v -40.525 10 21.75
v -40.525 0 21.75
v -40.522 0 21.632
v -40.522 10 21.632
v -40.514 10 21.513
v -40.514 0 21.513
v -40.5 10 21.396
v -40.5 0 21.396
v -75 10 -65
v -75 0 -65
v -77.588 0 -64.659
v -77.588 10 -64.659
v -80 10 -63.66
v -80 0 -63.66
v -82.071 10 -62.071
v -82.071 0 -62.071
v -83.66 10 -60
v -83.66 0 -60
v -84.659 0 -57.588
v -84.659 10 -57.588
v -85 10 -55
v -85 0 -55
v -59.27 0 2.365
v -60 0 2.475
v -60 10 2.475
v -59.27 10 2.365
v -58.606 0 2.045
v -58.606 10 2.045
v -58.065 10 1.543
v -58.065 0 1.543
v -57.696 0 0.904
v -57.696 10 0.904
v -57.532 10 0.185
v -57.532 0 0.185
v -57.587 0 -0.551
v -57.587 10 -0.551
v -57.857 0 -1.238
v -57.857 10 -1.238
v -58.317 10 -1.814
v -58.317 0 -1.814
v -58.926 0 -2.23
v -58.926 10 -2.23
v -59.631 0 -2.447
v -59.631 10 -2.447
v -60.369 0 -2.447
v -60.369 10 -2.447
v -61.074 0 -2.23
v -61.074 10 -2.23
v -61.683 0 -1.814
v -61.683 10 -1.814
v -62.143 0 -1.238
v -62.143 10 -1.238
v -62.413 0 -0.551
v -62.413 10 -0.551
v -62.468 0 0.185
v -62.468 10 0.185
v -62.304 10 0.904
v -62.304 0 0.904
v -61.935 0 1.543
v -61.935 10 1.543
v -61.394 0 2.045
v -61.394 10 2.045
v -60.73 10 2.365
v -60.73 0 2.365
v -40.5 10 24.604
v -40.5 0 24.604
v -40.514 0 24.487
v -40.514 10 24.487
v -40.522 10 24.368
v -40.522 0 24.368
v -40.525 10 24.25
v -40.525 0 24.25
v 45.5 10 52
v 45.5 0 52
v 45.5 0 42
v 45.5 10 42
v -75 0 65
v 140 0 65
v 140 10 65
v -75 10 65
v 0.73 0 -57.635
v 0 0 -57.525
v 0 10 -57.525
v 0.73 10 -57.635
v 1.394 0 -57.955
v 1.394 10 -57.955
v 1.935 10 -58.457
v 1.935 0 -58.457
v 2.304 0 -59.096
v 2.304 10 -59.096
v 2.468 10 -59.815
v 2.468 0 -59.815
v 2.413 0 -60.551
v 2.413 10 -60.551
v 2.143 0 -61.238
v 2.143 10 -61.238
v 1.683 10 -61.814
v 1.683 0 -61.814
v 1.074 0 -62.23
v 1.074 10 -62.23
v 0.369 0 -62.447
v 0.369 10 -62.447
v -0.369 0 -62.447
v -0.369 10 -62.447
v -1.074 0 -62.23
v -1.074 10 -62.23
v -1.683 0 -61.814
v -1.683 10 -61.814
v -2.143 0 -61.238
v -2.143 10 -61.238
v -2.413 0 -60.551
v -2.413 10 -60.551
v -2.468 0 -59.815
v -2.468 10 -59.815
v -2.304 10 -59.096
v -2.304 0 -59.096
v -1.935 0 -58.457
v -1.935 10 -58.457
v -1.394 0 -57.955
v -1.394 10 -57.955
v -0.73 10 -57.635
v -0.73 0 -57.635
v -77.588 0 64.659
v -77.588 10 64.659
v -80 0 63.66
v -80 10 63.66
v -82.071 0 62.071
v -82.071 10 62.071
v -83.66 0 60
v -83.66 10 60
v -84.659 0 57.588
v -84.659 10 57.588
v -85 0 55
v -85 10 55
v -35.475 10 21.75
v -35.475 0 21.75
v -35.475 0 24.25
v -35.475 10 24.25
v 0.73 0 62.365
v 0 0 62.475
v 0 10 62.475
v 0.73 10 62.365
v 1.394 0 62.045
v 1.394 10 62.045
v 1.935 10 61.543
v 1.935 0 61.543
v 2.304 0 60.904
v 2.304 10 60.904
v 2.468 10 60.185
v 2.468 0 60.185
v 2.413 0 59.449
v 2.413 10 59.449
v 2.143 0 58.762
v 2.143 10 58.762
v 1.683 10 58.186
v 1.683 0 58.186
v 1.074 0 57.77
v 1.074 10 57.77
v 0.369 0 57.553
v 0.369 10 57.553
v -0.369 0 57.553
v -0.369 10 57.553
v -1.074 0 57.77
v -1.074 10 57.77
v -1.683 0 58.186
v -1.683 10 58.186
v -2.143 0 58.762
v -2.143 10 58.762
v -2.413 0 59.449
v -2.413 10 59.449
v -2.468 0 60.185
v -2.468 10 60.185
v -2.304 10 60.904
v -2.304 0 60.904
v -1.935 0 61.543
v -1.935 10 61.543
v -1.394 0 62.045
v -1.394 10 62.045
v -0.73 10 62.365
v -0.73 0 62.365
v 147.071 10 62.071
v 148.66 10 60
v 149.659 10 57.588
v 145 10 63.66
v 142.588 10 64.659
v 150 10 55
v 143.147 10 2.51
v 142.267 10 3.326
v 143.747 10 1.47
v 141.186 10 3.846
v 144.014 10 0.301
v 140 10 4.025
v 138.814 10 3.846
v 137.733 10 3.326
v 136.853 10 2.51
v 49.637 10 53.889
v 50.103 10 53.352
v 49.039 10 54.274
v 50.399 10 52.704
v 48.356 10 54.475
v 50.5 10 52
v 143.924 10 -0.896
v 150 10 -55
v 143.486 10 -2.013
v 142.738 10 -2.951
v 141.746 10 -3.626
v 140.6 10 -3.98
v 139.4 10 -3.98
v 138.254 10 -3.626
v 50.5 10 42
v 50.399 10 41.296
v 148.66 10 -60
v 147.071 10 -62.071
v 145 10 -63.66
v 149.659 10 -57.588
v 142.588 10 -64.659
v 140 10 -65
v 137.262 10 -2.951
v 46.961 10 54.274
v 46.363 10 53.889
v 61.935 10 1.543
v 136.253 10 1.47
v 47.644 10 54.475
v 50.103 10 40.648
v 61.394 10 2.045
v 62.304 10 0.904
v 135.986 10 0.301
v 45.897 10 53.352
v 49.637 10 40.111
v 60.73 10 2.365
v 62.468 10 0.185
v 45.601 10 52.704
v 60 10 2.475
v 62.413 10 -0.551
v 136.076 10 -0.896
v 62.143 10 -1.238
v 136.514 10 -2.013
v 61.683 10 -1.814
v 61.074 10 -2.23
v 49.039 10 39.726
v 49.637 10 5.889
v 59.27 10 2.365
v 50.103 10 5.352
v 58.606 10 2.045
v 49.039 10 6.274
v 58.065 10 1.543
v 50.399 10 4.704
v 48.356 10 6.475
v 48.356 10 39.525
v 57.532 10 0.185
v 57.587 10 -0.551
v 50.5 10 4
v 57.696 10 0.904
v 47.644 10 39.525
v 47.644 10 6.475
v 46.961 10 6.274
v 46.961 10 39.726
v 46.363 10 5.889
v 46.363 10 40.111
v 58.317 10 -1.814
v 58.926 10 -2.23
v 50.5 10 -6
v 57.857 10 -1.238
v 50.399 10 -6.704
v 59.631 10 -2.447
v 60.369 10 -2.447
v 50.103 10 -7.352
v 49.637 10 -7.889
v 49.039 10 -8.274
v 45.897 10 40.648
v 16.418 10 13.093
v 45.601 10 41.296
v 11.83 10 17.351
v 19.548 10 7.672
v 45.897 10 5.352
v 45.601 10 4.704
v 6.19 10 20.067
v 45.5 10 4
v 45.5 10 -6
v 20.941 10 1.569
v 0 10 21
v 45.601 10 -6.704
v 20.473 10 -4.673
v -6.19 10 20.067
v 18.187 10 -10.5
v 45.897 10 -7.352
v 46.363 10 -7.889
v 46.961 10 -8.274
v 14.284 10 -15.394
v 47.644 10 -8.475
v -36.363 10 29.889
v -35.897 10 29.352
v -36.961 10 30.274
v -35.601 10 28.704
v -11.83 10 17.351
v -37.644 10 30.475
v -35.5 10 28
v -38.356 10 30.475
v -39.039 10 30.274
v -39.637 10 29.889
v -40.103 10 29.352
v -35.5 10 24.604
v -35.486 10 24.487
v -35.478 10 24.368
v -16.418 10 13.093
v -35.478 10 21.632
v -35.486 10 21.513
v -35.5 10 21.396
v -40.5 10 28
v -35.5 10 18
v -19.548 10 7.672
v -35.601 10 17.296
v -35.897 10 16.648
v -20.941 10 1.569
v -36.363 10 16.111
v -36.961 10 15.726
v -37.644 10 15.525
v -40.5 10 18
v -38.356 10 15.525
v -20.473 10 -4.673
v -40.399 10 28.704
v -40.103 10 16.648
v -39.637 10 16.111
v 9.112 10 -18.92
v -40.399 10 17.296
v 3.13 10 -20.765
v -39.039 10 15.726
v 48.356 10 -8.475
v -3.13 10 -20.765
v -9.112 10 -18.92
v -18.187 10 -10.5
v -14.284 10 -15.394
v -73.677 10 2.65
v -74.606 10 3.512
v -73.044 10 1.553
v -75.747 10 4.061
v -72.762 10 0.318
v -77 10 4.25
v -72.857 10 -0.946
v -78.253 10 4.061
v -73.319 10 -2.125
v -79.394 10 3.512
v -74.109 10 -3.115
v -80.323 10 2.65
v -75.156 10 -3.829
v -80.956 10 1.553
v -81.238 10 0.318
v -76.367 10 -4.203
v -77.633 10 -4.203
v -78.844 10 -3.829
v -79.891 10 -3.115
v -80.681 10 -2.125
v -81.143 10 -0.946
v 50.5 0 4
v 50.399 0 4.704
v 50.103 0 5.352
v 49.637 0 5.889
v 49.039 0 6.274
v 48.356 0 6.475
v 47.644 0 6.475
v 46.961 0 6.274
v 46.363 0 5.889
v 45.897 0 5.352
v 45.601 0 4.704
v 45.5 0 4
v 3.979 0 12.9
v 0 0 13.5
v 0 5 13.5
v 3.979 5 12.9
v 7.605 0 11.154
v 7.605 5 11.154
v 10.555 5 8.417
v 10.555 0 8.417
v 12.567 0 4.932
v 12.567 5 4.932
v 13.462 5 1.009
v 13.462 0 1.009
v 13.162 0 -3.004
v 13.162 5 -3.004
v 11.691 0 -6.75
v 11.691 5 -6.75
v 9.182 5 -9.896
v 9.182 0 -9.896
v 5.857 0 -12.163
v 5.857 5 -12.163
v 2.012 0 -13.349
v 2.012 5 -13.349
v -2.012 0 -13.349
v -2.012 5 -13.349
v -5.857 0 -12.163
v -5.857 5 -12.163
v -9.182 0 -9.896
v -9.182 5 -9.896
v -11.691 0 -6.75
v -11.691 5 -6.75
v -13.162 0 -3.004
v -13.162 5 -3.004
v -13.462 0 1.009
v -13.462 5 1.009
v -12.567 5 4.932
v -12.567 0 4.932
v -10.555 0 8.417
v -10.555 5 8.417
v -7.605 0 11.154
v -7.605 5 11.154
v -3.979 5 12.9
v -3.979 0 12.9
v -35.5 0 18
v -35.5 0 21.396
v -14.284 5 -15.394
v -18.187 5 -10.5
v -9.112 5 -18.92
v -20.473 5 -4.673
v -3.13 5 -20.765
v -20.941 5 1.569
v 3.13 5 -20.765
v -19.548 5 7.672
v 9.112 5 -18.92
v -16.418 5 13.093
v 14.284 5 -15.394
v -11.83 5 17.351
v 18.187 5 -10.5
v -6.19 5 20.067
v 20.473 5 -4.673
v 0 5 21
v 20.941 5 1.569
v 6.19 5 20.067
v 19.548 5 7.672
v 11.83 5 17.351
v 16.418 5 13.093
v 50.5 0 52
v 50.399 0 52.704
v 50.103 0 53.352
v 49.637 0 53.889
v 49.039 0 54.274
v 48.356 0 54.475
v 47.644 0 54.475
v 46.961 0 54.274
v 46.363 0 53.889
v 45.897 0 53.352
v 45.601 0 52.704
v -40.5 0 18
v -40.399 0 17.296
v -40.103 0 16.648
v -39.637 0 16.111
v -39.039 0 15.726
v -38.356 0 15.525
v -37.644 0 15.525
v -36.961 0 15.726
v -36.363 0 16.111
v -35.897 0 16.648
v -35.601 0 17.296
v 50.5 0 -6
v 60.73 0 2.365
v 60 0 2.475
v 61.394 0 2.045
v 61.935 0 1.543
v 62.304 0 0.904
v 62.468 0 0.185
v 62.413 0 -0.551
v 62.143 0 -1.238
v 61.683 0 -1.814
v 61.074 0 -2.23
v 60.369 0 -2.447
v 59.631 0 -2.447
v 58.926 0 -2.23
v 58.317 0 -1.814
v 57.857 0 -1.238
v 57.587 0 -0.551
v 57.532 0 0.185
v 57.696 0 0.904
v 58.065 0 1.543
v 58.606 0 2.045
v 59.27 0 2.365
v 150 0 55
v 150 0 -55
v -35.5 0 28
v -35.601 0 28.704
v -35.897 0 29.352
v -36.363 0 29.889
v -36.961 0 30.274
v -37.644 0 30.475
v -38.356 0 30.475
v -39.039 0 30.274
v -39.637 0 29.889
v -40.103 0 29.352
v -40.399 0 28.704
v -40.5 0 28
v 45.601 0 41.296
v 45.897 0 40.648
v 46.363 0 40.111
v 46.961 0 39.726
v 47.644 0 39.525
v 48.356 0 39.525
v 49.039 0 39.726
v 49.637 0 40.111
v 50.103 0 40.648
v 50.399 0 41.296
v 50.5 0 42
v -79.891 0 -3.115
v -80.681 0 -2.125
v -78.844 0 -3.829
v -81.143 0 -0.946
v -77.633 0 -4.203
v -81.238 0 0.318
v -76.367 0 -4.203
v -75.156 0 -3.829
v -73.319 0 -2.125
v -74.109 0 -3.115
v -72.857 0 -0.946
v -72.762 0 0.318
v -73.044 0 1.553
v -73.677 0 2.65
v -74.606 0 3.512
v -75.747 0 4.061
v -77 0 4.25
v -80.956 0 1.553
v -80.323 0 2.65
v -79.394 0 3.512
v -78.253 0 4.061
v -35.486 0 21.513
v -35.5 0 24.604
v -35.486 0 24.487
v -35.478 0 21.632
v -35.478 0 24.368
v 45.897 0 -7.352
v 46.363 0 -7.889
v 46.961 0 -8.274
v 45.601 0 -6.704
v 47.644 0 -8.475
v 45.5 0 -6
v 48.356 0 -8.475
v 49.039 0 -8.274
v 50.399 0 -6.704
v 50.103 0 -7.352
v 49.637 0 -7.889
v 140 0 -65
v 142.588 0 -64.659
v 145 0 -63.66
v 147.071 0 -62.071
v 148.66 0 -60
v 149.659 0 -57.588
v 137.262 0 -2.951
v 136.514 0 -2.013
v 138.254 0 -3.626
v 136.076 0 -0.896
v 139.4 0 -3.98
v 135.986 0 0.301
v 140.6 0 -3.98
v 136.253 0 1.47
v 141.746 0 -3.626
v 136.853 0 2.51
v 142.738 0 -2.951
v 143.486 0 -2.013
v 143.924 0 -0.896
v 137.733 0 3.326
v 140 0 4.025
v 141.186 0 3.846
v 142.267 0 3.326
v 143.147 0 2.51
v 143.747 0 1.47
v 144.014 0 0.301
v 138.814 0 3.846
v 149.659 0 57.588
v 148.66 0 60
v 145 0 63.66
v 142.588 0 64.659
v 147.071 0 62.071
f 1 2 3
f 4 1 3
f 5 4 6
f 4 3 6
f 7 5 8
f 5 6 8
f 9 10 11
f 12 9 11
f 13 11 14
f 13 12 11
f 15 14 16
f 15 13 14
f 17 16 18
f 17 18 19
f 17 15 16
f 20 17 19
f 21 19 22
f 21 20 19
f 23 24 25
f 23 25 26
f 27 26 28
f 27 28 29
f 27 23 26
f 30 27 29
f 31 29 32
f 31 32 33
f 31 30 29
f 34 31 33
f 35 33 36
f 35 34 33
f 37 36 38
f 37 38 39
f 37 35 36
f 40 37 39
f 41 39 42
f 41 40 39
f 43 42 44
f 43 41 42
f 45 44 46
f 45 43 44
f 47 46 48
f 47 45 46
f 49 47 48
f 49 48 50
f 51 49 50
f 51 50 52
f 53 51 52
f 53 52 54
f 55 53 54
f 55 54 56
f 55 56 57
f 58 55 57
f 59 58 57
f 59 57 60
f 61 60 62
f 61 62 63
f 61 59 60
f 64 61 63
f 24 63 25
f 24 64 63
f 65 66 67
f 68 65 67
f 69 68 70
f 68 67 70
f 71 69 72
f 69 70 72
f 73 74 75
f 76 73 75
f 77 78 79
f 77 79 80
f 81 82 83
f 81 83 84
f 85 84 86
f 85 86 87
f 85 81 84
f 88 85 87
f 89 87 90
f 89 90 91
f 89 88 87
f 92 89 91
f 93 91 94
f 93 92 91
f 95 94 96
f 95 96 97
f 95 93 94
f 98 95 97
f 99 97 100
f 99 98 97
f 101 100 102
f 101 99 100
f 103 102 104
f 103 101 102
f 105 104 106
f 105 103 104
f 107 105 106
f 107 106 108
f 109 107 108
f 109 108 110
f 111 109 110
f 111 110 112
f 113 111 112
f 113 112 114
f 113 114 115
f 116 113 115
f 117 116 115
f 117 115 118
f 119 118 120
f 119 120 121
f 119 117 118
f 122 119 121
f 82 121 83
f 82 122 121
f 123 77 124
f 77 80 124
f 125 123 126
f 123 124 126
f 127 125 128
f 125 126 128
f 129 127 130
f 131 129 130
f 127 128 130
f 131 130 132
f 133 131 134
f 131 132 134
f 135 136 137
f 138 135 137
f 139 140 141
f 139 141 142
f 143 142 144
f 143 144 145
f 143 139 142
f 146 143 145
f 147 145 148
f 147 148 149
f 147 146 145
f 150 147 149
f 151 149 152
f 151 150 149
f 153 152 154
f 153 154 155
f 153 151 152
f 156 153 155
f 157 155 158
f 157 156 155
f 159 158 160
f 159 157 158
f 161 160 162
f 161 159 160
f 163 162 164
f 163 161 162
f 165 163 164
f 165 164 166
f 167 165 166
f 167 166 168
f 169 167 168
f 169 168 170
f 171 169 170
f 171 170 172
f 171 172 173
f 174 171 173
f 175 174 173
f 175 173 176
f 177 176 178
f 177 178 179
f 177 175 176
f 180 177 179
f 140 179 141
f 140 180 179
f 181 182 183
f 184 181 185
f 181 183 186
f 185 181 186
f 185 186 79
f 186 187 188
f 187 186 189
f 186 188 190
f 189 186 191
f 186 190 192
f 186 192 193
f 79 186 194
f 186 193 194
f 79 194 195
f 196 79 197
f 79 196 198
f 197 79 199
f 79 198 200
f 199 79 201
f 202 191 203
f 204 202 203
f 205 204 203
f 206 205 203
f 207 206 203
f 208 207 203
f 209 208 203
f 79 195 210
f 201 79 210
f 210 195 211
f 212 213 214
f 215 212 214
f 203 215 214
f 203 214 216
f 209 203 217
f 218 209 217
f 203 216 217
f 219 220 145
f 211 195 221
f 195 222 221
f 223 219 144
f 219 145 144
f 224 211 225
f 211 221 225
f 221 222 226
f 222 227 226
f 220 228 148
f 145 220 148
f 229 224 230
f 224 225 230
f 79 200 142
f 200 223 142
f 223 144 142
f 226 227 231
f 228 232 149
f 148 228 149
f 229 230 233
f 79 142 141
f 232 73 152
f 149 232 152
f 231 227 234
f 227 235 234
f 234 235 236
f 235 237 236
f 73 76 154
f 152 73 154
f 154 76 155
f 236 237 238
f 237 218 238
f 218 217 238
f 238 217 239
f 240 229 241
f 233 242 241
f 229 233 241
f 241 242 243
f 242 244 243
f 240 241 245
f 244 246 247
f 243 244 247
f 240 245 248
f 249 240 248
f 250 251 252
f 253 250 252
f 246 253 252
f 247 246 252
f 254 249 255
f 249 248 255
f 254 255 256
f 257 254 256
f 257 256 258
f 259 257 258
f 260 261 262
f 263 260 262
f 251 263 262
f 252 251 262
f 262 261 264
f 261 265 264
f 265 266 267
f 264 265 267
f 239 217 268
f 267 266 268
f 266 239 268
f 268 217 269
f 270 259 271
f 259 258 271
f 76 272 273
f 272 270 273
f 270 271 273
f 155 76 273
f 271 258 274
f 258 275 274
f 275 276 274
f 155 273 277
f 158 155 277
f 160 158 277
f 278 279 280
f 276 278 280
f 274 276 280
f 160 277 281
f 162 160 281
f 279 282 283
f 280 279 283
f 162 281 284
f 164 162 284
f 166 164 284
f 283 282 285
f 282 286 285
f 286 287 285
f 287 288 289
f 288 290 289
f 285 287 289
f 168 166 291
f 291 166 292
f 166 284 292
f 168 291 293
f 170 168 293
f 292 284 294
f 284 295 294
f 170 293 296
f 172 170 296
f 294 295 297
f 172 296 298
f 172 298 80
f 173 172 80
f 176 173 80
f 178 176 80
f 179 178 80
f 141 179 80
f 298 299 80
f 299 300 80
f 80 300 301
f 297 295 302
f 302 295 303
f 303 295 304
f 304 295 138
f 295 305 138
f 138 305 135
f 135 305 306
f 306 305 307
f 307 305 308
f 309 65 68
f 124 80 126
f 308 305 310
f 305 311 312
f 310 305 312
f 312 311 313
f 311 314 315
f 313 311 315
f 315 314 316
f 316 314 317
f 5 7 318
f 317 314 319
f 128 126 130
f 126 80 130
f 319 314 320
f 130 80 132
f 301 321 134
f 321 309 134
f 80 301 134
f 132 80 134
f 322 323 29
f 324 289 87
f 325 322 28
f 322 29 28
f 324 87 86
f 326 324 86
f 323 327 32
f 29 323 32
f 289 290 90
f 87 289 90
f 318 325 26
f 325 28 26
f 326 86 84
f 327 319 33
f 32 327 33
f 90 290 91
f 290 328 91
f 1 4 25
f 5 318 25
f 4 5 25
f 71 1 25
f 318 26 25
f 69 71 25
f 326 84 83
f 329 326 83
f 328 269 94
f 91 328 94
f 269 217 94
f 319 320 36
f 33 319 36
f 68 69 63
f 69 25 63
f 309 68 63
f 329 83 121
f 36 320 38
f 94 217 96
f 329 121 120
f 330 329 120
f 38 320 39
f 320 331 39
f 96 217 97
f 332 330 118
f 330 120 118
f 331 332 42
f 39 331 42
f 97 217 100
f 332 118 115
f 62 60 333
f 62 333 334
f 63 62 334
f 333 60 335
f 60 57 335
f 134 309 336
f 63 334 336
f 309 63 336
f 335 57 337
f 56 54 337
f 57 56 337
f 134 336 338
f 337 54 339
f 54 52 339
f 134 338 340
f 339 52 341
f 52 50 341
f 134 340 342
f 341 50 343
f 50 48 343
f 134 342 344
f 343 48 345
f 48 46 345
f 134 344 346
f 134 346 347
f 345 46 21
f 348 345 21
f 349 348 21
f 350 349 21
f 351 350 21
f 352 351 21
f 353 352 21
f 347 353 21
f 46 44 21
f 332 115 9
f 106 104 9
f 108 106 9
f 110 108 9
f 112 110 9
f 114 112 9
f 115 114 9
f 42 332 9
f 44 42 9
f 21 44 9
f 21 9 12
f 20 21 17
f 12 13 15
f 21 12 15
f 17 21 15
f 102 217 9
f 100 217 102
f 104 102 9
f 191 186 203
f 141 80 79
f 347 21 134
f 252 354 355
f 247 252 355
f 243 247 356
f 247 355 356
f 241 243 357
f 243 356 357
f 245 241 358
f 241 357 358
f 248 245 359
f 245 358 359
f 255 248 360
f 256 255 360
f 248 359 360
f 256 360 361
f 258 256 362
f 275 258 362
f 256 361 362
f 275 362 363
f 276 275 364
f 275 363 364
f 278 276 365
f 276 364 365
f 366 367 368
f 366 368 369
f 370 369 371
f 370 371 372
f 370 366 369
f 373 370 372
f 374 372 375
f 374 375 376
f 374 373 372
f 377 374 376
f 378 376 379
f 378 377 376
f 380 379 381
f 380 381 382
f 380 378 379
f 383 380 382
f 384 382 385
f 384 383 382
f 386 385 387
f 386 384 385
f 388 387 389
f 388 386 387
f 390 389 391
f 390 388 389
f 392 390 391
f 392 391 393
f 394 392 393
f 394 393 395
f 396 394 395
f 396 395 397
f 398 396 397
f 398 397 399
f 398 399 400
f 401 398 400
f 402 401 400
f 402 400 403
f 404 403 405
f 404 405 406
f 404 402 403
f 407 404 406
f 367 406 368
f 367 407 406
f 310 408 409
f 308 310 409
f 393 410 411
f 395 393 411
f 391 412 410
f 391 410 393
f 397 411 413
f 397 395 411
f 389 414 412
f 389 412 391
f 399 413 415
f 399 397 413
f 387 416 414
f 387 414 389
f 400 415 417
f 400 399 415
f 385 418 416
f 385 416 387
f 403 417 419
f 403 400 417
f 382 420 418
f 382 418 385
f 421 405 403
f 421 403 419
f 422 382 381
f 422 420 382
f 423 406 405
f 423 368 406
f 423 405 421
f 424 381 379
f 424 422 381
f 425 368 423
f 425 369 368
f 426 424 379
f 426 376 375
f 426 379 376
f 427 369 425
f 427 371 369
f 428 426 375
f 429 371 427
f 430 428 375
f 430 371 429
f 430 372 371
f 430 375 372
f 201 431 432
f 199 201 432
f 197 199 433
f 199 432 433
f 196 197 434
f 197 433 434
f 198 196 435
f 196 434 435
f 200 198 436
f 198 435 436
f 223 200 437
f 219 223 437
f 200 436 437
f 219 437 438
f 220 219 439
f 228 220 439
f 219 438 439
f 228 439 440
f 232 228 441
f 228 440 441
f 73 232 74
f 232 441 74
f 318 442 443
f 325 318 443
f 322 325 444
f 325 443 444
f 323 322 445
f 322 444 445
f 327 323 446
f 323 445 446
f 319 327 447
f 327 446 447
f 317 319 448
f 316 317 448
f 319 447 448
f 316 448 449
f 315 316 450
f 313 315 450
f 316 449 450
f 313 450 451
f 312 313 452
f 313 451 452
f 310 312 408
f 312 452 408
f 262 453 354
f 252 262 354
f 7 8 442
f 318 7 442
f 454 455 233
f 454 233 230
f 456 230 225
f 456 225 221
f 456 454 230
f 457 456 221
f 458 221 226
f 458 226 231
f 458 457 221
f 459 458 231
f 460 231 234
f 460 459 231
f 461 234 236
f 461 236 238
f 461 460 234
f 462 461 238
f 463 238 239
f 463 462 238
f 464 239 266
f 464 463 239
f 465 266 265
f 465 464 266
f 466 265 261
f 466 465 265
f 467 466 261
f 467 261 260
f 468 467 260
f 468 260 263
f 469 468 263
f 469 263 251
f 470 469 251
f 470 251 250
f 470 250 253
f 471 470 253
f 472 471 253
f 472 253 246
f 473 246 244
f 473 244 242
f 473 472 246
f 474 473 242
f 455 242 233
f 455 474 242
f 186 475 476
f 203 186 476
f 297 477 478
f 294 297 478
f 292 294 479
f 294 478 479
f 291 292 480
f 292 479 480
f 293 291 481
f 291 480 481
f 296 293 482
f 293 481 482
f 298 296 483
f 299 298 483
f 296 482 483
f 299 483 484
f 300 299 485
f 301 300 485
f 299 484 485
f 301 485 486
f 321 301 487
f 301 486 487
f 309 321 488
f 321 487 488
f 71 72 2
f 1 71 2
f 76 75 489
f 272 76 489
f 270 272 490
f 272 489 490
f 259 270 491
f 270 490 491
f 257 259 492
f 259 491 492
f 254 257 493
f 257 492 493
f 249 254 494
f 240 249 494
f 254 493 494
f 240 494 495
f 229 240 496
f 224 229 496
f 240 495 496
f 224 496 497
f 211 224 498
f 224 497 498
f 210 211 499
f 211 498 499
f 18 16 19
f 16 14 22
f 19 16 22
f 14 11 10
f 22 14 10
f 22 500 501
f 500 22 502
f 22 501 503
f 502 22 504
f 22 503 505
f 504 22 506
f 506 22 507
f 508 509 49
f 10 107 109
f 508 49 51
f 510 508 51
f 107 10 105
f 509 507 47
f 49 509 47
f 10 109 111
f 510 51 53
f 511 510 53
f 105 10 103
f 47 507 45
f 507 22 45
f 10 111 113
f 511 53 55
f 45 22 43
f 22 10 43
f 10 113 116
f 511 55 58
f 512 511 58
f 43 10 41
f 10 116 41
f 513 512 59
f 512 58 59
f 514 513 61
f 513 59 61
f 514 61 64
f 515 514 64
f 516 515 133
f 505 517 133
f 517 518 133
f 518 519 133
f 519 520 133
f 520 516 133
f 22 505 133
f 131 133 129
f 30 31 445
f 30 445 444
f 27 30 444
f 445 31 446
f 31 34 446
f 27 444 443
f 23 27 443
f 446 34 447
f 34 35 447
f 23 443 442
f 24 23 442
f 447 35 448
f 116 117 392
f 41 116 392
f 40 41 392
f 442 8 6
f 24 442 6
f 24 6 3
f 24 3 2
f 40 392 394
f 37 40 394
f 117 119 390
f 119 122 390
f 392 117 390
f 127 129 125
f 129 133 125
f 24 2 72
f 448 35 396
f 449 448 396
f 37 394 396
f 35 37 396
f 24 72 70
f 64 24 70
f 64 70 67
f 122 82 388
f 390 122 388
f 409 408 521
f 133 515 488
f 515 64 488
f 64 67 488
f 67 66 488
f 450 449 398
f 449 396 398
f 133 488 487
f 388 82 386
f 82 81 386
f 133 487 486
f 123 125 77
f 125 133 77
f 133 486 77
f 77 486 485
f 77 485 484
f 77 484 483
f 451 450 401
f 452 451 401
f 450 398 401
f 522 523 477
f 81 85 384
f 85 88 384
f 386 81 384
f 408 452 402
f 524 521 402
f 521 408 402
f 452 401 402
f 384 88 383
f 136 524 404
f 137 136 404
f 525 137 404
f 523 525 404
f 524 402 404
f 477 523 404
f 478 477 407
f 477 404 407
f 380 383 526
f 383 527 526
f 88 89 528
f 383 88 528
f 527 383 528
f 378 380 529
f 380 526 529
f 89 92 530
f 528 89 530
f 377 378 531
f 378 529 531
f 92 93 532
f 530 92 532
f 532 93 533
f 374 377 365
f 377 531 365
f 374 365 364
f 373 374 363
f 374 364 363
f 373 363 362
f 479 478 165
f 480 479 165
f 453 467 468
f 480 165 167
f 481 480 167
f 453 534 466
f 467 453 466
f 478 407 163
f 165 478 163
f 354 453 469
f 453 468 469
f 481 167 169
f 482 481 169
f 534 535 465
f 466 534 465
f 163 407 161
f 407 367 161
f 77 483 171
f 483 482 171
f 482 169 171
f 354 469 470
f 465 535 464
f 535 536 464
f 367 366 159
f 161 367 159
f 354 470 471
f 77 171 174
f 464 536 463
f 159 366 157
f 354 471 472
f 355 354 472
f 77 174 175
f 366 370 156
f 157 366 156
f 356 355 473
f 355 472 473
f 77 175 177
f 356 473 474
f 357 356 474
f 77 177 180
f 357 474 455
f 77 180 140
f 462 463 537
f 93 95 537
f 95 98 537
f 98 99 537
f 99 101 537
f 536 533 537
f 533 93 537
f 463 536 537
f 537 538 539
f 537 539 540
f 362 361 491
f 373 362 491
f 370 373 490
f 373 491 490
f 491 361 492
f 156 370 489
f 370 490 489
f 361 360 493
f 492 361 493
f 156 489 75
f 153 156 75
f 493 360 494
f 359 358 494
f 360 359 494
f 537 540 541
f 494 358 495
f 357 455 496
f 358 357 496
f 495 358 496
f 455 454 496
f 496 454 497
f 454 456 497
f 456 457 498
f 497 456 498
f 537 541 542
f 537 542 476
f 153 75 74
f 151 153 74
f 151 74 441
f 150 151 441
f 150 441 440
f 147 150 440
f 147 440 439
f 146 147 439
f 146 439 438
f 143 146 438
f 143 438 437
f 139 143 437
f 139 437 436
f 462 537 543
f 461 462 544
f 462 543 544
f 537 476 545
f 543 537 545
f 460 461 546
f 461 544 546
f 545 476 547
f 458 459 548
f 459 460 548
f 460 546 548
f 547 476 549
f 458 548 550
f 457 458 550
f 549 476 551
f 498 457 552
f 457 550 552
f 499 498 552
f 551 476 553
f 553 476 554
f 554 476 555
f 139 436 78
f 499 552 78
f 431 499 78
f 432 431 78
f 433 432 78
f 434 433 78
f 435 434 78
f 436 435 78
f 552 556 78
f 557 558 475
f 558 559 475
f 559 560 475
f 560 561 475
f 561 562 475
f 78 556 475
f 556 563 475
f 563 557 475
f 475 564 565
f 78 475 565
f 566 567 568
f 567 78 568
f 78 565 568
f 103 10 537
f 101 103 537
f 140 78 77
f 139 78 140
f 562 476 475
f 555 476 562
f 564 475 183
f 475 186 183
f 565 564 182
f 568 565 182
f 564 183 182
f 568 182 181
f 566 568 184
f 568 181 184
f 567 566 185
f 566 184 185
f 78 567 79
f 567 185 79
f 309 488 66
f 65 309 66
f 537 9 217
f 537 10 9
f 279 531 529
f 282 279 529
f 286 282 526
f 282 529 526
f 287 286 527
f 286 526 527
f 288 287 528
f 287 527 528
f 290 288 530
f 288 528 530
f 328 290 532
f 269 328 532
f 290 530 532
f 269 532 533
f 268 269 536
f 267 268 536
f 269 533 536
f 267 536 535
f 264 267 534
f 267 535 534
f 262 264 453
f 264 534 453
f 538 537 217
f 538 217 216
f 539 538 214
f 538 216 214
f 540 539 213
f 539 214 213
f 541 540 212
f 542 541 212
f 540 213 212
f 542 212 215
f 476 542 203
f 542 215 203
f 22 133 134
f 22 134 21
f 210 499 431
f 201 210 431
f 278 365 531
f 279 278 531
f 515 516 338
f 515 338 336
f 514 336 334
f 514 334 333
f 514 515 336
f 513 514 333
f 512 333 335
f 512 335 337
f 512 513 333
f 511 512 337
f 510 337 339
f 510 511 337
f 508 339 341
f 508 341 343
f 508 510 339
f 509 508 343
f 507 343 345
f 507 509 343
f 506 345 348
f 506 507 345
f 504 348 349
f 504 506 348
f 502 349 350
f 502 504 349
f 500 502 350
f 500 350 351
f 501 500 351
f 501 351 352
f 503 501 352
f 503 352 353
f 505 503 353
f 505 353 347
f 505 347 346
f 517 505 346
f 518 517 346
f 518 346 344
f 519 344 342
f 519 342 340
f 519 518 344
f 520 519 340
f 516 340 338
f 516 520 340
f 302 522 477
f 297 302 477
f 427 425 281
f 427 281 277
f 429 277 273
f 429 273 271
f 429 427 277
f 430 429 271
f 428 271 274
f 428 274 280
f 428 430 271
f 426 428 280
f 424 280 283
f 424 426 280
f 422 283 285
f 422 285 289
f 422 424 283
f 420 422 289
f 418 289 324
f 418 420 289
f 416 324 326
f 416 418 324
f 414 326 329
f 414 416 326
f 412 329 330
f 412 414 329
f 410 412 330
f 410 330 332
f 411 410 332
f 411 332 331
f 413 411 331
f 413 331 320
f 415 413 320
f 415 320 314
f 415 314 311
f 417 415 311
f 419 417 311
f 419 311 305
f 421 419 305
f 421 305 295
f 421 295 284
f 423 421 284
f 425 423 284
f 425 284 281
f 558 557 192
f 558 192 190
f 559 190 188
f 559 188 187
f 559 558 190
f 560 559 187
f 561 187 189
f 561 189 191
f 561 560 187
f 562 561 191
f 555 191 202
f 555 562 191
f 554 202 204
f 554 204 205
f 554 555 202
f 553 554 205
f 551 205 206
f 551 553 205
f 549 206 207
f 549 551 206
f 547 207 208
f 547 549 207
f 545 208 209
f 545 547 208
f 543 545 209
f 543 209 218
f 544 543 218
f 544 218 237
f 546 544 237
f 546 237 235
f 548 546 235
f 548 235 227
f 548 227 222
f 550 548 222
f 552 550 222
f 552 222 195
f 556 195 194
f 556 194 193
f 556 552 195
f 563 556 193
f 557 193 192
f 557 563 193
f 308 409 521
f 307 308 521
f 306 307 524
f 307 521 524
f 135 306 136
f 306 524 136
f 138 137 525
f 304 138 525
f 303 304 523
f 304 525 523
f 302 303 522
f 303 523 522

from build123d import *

# Parameters (mm, degrees)
SKETCH1_R           = 2.475
SKETCH1_R_2         = 4.025
SKETCH1_R_3         = 21
BOSS_EXTRUDE1_DEPTH = 10
SKETCH1_5_R         = 4.25
BOSS_EXTRUDE4_DEPTH = 10
SKETCH1_4_R         = 21
SKETCH1_4_R_2       = 13.5
BOSS_EXTRUDE2_DEPTH = 5
FILLET1_R           = 10


with BuildPart() as part:
    # Sketch1 → Boss-Extrude1 (new body)
    with BuildSketch(Plane(origin=(0, 0, 0), x_dir=(1, 0, 0), z_dir=(0, 1, 0))):
        with BuildLine():
            ThreePointArc((0, 65), (-65, 0), (0, -65))
            Line((0, -65), (150, -65))
            Line((150, -65), (150, 65))
            Line((150, 65), (0, 65))
        make_face()
        with BuildLine():
            ThreePointArc((45.5, -42), (48, -39.5), (50.5, -42))
            Line((50.5, -42), (50.5, -52))
            ThreePointArc((50.5, -52), (48, -54.5), (45.5, -52))
            Line((45.5, -52), (45.5, -42))
        make_face(mode=Mode.SUBTRACT)
        with Locations((0, -60)):
            Circle(SKETCH1_R, mode=Mode.SUBTRACT)
        with Locations((-60, 0)):
            Circle(SKETCH1_R, mode=Mode.SUBTRACT)
        with Locations((0, 60)):
            Circle(SKETCH1_R, mode=Mode.SUBTRACT)
        with Locations((60, 0)):
            Circle(SKETCH1_R, mode=Mode.SUBTRACT)
        with Locations((140, 0)):
            Circle(SKETCH1_R_2, mode=Mode.SUBTRACT)
        with BuildLine():
            Line((50.5, 6), (50.5, -4))
            ThreePointArc((50.5, -4), (48, -6.5), (45.5, -4))
            Line((45.5, -4), (45.5, 6))
            ThreePointArc((45.5, 6), (48, 8.5), (50.5, 6))
        make_face(mode=Mode.SUBTRACT)
        with BuildLine():
            ThreePointArc((-40.5, -24.604436172), (-40.518742246, -24.42765838), (-40.525, -24.25))
            Line((-40.525, -24.25), (-40.525, -21.75))
            ThreePointArc((-40.525, -21.75), (-40.518742246, -21.57234162), (-40.5, -21.395563828))
            Line((-40.5, -21.395563828), (-40.5, -18))
            ThreePointArc((-40.5, -18), (-38, -15.5), (-35.5, -18))
            Line((-35.5, -18), (-35.5, -21.395563828))
            ThreePointArc((-35.5, -21.395563828), (-35.481257754, -21.57234162), (-35.475, -21.75))
            Line((-35.475, -21.75), (-35.475, -24.25))
            ThreePointArc((-35.475, -24.25), (-35.481257754, -24.42765838), (-35.5, -24.604436172))
            Line((-35.5, -24.604436172), (-35.5, -28))
            ThreePointArc((-35.5, -28), (-38, -30.5), (-40.5, -28))
            Line((-40.5, -28), (-40.5, -24.604436172))
        make_face(mode=Mode.SUBTRACT)
        Circle(SKETCH1_R_3, mode=Mode.SUBTRACT)
    extrude(amount=BOSS_EXTRUDE1_DEPTH)

    # Sketch1<5> → Boss-Extrude4 (add)
    with BuildSketch(Plane(origin=(0, 0, 0), x_dir=(1, 0, 0), z_dir=(0, 1, 0))):
        with BuildLine():
            ThreePointArc((0, -65), (-65, 0), (0, 65))
            Line((0, 65), (-85, 65))
            Line((-85, 65), (-85, -65))
            Line((-85, -65), (0, -65))
        make_face()
        with Locations((-77, 0)):
            Circle(SKETCH1_5_R, mode=Mode.SUBTRACT)
    extrude(amount=BOSS_EXTRUDE4_DEPTH)

    # Sketch1<4> → Boss-Extrude2 (add)
    with BuildSketch(Plane(origin=(0, 0, 0), x_dir=(1, 0, 0), z_dir=(0, 1, 0))):
        Circle(SKETCH1_4_R)
        Circle(SKETCH1_4_R_2, mode=Mode.SUBTRACT)
    extrude(amount=BOSS_EXTRUDE2_DEPTH)

    # Fillet1
    fillet1_edges = [part.edges().sort_by_distance(p)[0] for p in [
        (150, 5, 65),
        (150, 5, -65),
        (-85, 5, -65),
        (-85, 5, 65),
    ]]
    fillet(fillet1_edges, radius=FILLET1_R)


solid = part.part
